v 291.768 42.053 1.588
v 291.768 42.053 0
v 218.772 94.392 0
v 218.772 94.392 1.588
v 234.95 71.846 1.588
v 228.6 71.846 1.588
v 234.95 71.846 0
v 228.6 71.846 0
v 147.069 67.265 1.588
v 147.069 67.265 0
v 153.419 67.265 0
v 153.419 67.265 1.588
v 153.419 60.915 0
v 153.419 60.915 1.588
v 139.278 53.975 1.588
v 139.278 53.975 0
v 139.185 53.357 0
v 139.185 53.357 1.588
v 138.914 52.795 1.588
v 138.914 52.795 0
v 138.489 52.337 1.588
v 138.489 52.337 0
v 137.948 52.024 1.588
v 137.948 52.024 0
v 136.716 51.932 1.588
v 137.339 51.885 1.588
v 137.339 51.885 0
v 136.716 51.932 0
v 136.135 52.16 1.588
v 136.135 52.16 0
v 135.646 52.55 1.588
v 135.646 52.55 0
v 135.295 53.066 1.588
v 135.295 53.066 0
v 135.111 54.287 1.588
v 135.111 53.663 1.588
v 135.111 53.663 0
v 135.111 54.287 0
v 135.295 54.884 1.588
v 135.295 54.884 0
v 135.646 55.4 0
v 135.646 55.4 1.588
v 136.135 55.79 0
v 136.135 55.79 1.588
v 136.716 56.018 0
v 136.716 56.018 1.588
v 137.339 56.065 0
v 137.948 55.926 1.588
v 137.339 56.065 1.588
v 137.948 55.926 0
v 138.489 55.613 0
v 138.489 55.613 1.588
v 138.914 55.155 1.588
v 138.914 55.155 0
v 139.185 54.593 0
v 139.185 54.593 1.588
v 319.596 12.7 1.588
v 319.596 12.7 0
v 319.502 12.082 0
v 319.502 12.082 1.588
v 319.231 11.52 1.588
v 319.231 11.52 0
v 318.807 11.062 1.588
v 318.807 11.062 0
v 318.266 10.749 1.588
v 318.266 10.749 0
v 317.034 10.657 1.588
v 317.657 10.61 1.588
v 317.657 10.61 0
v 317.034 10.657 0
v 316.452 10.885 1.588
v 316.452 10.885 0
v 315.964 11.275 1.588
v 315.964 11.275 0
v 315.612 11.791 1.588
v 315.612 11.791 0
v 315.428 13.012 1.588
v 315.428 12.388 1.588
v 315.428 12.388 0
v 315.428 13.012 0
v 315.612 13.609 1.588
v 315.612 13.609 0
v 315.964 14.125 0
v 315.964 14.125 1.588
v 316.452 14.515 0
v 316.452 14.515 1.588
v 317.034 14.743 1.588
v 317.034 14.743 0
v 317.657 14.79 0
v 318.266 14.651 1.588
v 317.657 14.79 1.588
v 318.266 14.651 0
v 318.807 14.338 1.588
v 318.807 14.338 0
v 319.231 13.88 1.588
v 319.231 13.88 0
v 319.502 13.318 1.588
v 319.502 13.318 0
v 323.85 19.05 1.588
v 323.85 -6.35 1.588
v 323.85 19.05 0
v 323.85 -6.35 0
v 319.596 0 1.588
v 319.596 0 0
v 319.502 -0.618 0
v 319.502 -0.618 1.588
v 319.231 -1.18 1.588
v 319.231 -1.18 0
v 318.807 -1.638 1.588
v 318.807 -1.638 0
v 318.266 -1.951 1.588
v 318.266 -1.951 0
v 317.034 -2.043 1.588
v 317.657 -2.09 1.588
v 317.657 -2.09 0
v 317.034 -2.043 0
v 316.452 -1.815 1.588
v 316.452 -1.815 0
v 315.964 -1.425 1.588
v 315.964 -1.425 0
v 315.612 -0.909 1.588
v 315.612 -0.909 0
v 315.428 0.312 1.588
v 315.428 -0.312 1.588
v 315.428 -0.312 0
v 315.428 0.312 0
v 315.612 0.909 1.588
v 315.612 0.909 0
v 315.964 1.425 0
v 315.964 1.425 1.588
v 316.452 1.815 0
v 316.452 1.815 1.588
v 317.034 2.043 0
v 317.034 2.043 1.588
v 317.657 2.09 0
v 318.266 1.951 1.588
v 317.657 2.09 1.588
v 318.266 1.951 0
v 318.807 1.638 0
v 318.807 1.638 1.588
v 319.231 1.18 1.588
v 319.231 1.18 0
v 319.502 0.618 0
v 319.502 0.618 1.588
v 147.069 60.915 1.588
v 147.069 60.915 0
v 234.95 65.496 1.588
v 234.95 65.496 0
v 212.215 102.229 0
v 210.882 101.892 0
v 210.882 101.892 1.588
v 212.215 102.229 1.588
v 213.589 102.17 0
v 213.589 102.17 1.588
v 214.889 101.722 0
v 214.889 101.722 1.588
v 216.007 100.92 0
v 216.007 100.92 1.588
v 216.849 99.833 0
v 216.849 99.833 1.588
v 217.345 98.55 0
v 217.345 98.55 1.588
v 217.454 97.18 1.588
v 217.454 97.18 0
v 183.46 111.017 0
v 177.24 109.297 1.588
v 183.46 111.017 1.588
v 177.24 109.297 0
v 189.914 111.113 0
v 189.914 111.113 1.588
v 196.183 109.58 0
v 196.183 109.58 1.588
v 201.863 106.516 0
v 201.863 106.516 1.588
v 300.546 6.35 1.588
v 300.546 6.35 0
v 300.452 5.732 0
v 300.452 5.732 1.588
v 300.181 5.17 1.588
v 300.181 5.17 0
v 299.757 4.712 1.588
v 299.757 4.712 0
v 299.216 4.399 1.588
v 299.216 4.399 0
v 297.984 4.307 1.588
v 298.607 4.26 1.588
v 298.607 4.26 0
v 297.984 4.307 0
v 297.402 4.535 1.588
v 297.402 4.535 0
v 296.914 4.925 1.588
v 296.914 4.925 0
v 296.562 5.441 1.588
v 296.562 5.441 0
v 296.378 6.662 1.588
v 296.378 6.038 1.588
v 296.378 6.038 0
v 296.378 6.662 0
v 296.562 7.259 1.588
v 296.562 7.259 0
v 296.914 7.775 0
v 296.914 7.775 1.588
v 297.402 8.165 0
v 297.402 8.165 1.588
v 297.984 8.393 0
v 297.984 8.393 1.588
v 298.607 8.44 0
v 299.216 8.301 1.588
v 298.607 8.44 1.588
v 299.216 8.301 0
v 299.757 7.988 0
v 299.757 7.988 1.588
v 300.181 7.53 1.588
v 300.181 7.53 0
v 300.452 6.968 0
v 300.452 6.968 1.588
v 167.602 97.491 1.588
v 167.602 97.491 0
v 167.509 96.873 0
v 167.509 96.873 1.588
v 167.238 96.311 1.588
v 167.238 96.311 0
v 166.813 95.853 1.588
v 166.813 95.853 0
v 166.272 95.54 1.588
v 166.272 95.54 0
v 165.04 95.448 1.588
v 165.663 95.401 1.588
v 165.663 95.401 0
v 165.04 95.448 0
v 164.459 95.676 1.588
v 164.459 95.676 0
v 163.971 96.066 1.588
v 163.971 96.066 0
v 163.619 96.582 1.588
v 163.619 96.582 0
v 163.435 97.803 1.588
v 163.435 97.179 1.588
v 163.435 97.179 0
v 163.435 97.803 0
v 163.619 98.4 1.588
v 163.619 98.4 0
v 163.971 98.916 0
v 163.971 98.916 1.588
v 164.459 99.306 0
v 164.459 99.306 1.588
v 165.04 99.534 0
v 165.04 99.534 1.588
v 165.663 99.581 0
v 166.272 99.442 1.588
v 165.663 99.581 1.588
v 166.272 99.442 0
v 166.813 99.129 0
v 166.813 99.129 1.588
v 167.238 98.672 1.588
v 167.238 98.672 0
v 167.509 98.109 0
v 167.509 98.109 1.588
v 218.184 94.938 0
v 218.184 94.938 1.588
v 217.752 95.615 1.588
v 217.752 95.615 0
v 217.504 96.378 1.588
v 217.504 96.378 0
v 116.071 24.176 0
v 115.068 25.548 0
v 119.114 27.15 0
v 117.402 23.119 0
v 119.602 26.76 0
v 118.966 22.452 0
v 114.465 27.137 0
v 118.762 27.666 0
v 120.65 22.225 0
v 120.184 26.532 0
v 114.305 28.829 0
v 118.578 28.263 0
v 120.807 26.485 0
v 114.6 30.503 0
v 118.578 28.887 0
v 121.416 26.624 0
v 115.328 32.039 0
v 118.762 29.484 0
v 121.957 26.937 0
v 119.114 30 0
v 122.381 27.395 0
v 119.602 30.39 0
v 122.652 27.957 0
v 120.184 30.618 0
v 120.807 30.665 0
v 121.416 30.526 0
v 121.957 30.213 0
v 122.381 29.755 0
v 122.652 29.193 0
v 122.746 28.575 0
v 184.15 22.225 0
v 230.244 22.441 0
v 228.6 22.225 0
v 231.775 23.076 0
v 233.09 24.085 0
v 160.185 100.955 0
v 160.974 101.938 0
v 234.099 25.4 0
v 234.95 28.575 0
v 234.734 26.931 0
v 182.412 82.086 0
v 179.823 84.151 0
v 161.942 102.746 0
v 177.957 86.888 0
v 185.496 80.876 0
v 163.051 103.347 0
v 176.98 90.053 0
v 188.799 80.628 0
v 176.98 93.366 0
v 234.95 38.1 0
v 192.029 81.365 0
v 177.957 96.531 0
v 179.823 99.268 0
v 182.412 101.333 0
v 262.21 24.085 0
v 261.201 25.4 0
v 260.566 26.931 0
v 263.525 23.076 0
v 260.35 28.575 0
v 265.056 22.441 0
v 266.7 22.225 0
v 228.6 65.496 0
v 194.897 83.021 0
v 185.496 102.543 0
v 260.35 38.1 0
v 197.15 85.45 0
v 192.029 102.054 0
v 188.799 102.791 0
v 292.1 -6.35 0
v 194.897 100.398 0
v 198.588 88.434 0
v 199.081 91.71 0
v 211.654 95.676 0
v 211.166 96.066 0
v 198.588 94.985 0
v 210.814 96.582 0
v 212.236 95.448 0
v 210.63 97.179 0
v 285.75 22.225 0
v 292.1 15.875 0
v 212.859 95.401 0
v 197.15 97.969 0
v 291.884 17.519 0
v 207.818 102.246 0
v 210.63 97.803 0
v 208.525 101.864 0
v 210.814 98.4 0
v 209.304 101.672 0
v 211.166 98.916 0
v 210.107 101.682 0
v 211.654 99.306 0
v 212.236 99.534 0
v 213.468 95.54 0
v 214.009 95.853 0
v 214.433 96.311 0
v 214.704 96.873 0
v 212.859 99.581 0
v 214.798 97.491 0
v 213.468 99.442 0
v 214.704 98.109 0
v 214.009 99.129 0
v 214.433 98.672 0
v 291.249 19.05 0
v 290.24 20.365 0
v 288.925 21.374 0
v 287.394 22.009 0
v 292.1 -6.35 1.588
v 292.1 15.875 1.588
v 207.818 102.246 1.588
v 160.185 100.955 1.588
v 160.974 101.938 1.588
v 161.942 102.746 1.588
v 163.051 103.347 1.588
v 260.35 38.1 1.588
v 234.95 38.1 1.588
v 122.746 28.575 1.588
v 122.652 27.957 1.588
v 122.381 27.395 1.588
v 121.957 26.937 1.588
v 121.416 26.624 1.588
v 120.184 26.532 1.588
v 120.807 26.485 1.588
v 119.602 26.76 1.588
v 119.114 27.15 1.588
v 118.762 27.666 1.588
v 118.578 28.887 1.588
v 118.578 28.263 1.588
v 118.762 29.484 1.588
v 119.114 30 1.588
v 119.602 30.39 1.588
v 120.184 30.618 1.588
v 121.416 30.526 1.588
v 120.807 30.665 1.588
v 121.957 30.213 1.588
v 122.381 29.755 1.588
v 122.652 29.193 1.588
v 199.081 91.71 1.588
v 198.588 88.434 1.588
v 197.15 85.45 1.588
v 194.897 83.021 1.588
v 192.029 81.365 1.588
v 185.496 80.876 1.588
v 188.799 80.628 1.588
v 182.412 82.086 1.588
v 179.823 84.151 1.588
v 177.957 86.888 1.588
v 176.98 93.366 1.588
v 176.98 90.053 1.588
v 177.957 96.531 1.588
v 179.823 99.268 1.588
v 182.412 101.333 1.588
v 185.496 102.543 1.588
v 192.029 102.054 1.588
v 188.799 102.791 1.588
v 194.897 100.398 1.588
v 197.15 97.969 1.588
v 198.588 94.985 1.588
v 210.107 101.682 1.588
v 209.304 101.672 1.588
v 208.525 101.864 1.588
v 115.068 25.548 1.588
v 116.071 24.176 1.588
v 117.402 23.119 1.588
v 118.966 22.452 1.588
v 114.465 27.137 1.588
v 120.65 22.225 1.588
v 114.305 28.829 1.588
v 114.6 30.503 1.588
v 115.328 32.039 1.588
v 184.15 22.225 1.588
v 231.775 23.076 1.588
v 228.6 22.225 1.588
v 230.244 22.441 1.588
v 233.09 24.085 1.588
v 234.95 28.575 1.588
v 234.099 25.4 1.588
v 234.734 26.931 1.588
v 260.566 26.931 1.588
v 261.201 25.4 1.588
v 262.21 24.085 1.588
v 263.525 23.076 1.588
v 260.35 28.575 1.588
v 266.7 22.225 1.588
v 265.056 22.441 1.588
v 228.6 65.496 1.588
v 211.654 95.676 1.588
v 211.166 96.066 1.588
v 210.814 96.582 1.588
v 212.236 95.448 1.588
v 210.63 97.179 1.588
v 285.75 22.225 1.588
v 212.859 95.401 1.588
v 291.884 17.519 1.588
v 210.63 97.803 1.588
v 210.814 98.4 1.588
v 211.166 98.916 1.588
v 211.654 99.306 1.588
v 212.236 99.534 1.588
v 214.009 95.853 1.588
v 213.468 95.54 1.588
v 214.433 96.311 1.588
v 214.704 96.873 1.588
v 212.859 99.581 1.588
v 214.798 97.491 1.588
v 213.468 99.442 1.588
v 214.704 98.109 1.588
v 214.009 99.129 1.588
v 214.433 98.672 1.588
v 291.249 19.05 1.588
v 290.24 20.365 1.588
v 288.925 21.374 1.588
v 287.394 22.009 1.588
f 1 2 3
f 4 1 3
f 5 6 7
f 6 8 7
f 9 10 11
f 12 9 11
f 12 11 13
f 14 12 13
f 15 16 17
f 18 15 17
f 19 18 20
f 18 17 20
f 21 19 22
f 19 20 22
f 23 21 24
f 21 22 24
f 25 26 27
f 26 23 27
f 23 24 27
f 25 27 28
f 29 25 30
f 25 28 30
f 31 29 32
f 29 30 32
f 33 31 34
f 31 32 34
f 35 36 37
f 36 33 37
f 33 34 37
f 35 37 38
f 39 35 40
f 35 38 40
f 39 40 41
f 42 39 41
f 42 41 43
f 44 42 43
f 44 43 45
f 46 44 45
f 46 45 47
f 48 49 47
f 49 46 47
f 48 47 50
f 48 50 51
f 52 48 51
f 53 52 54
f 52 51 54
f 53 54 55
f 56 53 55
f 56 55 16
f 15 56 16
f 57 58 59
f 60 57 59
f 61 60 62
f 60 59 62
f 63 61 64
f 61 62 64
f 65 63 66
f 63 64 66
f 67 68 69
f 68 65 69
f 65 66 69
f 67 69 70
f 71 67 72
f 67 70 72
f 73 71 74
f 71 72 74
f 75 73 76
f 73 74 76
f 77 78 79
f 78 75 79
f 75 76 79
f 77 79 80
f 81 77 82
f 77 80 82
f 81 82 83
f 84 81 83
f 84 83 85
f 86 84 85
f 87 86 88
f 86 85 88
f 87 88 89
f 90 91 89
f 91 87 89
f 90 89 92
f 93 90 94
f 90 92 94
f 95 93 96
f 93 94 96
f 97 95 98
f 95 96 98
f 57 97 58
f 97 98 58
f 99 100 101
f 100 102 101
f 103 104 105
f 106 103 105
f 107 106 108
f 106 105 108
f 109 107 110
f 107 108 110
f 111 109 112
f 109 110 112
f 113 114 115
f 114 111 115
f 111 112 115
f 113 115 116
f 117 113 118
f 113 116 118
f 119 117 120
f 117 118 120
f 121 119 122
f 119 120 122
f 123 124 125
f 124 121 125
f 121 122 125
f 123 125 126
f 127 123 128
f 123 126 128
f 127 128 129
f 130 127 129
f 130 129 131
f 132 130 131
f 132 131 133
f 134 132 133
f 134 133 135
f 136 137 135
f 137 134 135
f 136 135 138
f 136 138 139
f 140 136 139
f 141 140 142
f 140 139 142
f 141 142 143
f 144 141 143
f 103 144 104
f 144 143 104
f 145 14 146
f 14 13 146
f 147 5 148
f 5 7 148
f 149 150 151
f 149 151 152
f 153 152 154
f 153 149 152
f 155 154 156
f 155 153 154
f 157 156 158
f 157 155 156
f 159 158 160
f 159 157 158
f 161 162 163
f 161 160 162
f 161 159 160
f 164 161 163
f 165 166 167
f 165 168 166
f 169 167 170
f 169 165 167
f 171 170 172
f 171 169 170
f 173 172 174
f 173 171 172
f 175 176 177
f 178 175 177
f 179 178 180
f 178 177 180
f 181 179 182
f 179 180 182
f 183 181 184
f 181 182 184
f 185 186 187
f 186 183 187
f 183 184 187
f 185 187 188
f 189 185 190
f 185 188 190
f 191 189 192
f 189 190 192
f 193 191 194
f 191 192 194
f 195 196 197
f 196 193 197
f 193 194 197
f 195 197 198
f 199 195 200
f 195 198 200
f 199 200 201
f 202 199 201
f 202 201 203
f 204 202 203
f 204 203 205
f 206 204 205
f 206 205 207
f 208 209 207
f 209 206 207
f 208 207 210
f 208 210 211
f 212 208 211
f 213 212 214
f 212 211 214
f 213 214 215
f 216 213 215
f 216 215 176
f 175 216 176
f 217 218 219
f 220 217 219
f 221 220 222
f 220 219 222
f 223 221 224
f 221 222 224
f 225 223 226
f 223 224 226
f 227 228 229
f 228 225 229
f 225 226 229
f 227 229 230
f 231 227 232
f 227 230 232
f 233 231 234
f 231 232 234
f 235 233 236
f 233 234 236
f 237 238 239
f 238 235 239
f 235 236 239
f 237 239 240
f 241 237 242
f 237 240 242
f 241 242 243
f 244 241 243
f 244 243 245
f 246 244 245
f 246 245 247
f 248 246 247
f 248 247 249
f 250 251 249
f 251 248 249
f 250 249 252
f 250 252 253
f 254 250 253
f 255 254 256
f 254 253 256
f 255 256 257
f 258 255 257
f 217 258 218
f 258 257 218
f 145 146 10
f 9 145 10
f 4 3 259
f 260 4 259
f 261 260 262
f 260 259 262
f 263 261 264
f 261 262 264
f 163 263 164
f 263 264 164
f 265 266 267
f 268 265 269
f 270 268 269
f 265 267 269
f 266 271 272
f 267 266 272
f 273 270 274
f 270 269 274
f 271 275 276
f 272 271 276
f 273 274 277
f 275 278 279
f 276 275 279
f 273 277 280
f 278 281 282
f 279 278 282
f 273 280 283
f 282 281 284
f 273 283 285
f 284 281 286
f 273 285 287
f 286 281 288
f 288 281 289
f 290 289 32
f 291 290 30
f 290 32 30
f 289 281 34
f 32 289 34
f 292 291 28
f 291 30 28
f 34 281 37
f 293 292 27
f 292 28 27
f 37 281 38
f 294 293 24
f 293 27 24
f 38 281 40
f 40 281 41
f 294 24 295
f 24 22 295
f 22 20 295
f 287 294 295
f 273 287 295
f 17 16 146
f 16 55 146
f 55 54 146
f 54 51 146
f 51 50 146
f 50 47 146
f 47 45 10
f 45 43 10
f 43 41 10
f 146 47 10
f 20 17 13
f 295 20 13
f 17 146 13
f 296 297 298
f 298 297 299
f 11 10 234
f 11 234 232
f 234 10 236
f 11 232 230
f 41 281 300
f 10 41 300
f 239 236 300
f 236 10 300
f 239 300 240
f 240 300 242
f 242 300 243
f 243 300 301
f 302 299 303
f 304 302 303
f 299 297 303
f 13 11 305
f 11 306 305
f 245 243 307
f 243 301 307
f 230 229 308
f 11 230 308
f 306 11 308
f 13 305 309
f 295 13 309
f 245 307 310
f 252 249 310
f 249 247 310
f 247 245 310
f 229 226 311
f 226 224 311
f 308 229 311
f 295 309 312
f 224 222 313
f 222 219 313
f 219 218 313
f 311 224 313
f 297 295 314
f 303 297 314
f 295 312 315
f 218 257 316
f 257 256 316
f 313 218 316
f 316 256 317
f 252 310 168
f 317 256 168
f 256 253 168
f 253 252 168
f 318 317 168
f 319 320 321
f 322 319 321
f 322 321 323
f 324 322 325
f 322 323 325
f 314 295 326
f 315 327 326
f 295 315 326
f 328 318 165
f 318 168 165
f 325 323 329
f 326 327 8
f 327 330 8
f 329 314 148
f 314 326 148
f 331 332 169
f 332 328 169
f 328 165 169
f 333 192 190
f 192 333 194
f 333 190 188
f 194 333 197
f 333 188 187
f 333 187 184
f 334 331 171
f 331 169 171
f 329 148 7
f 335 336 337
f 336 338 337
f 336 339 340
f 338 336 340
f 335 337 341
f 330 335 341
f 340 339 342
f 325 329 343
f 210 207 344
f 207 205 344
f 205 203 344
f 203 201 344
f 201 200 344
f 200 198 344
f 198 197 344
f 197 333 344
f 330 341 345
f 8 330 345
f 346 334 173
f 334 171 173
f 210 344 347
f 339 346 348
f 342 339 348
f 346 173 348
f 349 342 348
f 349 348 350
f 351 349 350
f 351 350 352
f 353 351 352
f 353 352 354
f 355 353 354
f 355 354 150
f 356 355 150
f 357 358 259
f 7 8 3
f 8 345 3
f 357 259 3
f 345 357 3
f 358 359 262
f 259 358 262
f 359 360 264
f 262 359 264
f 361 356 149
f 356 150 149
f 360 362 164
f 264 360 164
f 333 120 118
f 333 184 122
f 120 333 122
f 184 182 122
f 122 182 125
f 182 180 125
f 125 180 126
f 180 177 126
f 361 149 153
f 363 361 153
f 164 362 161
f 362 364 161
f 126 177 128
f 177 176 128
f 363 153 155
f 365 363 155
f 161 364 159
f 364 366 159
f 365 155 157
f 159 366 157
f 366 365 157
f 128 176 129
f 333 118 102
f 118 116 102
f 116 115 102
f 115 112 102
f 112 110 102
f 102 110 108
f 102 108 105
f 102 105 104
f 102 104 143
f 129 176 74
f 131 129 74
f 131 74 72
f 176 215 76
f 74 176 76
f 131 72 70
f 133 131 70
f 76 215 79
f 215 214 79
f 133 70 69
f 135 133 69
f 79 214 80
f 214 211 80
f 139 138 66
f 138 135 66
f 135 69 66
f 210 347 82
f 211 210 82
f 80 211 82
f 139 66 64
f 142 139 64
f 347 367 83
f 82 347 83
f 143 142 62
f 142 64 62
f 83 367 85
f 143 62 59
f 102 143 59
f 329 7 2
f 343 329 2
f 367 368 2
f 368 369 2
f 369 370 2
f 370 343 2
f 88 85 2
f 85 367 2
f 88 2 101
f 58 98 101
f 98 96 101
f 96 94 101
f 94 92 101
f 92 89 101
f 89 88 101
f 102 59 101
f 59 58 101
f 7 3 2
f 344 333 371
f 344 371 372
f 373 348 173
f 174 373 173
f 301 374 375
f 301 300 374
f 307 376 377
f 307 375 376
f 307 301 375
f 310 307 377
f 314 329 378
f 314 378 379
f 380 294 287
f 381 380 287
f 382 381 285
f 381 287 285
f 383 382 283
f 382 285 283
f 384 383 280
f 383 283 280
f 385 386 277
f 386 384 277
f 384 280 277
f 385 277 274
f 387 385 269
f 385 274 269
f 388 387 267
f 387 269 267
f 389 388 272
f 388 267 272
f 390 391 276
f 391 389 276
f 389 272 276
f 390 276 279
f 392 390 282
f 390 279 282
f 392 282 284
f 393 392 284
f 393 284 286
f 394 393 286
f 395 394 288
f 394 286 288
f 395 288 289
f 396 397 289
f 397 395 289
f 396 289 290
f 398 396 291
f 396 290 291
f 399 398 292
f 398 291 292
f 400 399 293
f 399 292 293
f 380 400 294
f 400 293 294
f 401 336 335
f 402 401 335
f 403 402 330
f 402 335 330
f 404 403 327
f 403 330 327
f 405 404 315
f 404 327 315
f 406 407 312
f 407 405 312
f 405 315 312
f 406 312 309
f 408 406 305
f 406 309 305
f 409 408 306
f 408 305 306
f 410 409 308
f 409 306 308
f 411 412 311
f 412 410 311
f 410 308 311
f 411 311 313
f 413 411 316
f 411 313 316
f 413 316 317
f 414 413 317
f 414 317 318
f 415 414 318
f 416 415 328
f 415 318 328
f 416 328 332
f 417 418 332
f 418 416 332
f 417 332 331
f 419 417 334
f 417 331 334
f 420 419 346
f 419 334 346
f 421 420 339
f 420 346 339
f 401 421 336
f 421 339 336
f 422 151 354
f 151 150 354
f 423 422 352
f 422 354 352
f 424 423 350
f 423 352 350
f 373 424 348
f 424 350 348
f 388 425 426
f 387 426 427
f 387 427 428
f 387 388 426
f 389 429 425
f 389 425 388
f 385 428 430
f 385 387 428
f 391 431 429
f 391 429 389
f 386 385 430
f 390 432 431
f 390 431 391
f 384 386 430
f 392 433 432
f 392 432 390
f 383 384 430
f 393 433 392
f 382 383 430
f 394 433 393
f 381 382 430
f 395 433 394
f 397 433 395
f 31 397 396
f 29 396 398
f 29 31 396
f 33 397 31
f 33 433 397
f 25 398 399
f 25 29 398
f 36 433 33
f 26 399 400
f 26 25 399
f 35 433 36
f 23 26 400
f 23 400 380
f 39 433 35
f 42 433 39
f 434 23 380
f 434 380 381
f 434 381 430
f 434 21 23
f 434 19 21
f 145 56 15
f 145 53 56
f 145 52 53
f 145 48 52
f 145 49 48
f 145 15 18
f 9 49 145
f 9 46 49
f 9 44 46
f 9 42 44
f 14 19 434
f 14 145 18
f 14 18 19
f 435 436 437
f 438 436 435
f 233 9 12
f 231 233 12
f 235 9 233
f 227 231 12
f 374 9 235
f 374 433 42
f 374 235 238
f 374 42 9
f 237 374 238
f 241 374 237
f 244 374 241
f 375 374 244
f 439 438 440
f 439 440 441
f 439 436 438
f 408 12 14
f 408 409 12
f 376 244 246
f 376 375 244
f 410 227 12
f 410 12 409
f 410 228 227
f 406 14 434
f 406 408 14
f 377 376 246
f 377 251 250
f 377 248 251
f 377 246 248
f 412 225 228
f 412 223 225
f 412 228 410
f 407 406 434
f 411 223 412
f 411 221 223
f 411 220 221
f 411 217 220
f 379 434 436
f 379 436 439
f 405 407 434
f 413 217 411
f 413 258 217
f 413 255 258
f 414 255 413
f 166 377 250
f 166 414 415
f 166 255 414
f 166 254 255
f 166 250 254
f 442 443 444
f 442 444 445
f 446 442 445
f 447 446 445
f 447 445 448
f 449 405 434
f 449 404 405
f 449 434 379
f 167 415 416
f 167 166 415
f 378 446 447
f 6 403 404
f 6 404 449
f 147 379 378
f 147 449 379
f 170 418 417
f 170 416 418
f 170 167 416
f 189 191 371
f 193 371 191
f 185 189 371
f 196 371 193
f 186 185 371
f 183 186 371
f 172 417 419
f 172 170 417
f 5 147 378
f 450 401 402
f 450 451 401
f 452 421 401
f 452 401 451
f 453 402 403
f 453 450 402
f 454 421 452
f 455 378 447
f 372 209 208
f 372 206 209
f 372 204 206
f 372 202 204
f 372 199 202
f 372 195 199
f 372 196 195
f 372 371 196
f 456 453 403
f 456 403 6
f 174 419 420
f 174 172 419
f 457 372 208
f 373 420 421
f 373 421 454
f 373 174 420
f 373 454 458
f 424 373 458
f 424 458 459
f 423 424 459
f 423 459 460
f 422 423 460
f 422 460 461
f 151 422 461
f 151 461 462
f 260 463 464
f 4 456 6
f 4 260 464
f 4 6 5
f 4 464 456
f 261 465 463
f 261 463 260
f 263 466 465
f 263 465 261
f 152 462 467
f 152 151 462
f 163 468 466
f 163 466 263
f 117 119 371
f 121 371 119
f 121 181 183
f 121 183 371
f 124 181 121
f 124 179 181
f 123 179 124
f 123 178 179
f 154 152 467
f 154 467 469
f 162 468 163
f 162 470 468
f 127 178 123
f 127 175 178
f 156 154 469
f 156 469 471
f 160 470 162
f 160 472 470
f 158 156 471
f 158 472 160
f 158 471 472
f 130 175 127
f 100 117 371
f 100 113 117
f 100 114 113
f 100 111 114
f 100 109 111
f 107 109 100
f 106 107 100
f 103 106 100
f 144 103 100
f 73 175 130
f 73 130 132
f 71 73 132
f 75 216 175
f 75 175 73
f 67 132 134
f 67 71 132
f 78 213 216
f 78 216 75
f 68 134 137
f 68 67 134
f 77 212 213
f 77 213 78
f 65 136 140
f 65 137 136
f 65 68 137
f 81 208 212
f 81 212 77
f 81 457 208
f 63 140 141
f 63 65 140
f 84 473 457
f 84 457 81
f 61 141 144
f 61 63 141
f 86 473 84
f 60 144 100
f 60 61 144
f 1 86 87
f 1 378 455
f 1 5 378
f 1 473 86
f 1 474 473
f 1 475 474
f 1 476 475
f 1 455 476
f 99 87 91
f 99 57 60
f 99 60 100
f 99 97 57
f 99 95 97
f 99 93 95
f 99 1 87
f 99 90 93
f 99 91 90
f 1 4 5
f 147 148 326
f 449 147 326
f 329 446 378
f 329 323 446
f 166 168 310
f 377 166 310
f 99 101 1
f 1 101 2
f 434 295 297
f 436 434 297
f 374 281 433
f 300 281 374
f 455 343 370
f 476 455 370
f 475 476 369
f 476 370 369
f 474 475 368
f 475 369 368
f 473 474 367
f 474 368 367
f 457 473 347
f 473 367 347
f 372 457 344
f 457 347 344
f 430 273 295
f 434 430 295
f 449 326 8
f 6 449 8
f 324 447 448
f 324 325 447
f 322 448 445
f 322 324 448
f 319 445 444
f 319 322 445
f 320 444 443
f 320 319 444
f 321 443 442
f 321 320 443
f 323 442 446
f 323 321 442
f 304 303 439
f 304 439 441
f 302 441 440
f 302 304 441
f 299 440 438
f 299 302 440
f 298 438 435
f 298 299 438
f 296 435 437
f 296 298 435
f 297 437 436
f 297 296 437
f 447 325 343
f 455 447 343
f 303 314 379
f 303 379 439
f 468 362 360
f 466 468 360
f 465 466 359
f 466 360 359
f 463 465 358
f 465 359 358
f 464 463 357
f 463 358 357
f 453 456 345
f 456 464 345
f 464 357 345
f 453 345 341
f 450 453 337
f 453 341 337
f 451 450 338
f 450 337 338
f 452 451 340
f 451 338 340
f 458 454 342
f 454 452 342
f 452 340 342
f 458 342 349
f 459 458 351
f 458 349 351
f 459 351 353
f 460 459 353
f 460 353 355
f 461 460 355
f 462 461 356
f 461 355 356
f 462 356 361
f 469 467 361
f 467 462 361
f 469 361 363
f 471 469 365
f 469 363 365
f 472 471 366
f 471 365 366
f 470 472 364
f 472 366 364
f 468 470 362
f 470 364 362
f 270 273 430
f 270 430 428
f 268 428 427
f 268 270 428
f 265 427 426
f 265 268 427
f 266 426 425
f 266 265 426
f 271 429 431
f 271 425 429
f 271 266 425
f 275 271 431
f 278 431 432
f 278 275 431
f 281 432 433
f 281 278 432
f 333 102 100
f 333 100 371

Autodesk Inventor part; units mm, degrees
ref_plane "YZ Plane" through (0, 0, 0) normal (1, 0, 0) x (0, 1, 0)
ref_plane "XZ Plane" through (0, 0, 0) normal (0, 1, 0) x (-1, 0, 0)
ref_plane "XY Plane" through (0, 0, 0) normal (0, 0, 1) x (1, 0, 0)
sketch "Sketch1" plane through (0, 0, 0) normal (0, 0, 1) x (1, 0, 0)
  line L0 (177.2398, 109.2972) -> (163.051, 103.3471)
  line L1 (323.85, -6.35) -> (323.85, 19.05)
  line L2 (323.85, -6.35) -> (292.1, -6.35)
  line L3 (292.1, -6.35) -> (292.1, 15.875)
  line L4 (292.1, -6.35) -> (323.85, -6.35)
  arc A0 (292.1, 15.875) -> (285.75, 22.225) centre (285.75, 15.875) ccw
  circle A1 centre (317.5, 0) radius 2.0955
  circle A2 centre (317.5, 12.7) radius 2.0955
  line L5 (120.65, 22.225) -> (184.15, 22.225)
  circle A3 centre (298.45, 6.35) radius 2.0955
  arc A4 (201.8633, 106.5157) -> (177.2398, 109.2972) centre (187.0626, 85.8735) ccw
  circle A5 centre (187.9687, 91.7095) radius 11.1125
  line L6 (260.35, 28.575) -> (260.35, 38.1)
  line L7 (260.35, 38.1) -> (234.95, 38.1)
  line L8 (234.95, 38.1) -> (234.95, 28.575)
  line L9 (184.15, 22.225) -> (228.6, 22.225)
  line L10 (266.7, 22.225) -> (285.75, 22.225)
  arc A6 (228.6, 22.225) -> (234.95, 28.575) centre (228.6, 28.575) ccw
  arc A7 (260.35, 28.575) -> (266.7, 22.225) centre (266.7, 28.575) ccw
  line L11 (115.328, 32.039) -> (160.1848, 100.9551)
  line L12 (323.85, 19.05) -> (291.7679, 42.0532)
  circle A8 centre (120.65, 28.575) radius 2.0955
  circle A9 centre (165.5067, 97.4911) radius 2.0955
  arc A10 (115.328, 32.039) -> (120.65, 22.225) centre (120.65, 28.575) ccw
  arc A11 (163.051, 103.3471) -> (160.1848, 100.9551) centre (165.5067, 97.4911) ccw
  circle A12 centre (137.1826, 53.975) radius 2.0955
  line L13 (228.6, 71.8456) -> (234.95, 71.8456)
  line L14 (234.95, 71.8456) -> (234.95, 65.4956)
  line L15 (234.95, 65.4956) -> (228.6, 65.4956)
  line L16 (228.6, 65.4956) -> (228.6, 71.8456)
  line L17 (228.6, 71.8456) -> (234.95, 65.4956) construction
  line L18 (234.95, 71.8456) -> (228.6, 65.4956) construction
  line L19 (147.0693, 67.265) -> (153.4193, 67.265)
  line L20 (153.4193, 67.265) -> (153.4193, 60.915)
  line L21 (153.4193, 60.915) -> (147.0693, 60.915)
  line L22 (147.0693, 60.915) -> (147.0693, 67.265)
  line L23 (147.0693, 67.265) -> (153.4193, 60.915) construction
  line L24 (153.4193, 67.265) -> (147.0693, 60.915) construction
  circle A13 centre (212.702, 97.4911) radius 2.0955
  arc A14 (217.4543, 97.1796) -> (210.8819, 101.8921) centre (212.702, 97.4911) ccw
  line L25 (323.85, 19.05) -> (218.7724, 94.3917)
  line L26 (207.8184, 102.2458) -> (201.8633, 106.5157)
  arc A15 (207.8184, 102.2458) -> (210.8819, 101.8921) centre (209.6685, 104.8261) ccw
  arc A16 (217.4543, 97.1796) -> (218.7724, 94.3917) centre (220.6225, 96.972) ccw
  point P0 (292.1, 22.225)
  point P1 (146.05, 22.225)
  point P2 (260.35, 22.225)
  point P3 (124.6512, 46.3627)
  point P4 (148.9618, 83.7126)
  point P5 (217.0763, 95.6078)
  point P6 (209.5145, 101.0297)
  dimension "d14" = 31.75
  dimension "d15" = 28.575
  dimension "d16" = 6.35
  dimension "d18" = 4.191
  dimension "d19" = 4.191
  dimension "d29" = 4.191
  dimension "d30" = 25.4
  dimension "d32" = 22.225
  dimension "d37" = 15.875
  dimension "d38" = 6.35
  dimension "d105" = 12.7
  dimension "d106" = 12.7
  dimension "d107" = 4.191
  dimension "d108" = 6.35
  dimension "d109" = 6.35
  dimension "d110" = 6.35
  dimension "d111" = 6.35
  dimension "d113" = 4.191
  dimension "d114" = 9.525
  dimension "d115" = 3.175
extrude "Extrusion1" add sketch "Sketch1" along normal blind 1.5875
properties part number "plate_mid" material "Acetal Resin, White"
